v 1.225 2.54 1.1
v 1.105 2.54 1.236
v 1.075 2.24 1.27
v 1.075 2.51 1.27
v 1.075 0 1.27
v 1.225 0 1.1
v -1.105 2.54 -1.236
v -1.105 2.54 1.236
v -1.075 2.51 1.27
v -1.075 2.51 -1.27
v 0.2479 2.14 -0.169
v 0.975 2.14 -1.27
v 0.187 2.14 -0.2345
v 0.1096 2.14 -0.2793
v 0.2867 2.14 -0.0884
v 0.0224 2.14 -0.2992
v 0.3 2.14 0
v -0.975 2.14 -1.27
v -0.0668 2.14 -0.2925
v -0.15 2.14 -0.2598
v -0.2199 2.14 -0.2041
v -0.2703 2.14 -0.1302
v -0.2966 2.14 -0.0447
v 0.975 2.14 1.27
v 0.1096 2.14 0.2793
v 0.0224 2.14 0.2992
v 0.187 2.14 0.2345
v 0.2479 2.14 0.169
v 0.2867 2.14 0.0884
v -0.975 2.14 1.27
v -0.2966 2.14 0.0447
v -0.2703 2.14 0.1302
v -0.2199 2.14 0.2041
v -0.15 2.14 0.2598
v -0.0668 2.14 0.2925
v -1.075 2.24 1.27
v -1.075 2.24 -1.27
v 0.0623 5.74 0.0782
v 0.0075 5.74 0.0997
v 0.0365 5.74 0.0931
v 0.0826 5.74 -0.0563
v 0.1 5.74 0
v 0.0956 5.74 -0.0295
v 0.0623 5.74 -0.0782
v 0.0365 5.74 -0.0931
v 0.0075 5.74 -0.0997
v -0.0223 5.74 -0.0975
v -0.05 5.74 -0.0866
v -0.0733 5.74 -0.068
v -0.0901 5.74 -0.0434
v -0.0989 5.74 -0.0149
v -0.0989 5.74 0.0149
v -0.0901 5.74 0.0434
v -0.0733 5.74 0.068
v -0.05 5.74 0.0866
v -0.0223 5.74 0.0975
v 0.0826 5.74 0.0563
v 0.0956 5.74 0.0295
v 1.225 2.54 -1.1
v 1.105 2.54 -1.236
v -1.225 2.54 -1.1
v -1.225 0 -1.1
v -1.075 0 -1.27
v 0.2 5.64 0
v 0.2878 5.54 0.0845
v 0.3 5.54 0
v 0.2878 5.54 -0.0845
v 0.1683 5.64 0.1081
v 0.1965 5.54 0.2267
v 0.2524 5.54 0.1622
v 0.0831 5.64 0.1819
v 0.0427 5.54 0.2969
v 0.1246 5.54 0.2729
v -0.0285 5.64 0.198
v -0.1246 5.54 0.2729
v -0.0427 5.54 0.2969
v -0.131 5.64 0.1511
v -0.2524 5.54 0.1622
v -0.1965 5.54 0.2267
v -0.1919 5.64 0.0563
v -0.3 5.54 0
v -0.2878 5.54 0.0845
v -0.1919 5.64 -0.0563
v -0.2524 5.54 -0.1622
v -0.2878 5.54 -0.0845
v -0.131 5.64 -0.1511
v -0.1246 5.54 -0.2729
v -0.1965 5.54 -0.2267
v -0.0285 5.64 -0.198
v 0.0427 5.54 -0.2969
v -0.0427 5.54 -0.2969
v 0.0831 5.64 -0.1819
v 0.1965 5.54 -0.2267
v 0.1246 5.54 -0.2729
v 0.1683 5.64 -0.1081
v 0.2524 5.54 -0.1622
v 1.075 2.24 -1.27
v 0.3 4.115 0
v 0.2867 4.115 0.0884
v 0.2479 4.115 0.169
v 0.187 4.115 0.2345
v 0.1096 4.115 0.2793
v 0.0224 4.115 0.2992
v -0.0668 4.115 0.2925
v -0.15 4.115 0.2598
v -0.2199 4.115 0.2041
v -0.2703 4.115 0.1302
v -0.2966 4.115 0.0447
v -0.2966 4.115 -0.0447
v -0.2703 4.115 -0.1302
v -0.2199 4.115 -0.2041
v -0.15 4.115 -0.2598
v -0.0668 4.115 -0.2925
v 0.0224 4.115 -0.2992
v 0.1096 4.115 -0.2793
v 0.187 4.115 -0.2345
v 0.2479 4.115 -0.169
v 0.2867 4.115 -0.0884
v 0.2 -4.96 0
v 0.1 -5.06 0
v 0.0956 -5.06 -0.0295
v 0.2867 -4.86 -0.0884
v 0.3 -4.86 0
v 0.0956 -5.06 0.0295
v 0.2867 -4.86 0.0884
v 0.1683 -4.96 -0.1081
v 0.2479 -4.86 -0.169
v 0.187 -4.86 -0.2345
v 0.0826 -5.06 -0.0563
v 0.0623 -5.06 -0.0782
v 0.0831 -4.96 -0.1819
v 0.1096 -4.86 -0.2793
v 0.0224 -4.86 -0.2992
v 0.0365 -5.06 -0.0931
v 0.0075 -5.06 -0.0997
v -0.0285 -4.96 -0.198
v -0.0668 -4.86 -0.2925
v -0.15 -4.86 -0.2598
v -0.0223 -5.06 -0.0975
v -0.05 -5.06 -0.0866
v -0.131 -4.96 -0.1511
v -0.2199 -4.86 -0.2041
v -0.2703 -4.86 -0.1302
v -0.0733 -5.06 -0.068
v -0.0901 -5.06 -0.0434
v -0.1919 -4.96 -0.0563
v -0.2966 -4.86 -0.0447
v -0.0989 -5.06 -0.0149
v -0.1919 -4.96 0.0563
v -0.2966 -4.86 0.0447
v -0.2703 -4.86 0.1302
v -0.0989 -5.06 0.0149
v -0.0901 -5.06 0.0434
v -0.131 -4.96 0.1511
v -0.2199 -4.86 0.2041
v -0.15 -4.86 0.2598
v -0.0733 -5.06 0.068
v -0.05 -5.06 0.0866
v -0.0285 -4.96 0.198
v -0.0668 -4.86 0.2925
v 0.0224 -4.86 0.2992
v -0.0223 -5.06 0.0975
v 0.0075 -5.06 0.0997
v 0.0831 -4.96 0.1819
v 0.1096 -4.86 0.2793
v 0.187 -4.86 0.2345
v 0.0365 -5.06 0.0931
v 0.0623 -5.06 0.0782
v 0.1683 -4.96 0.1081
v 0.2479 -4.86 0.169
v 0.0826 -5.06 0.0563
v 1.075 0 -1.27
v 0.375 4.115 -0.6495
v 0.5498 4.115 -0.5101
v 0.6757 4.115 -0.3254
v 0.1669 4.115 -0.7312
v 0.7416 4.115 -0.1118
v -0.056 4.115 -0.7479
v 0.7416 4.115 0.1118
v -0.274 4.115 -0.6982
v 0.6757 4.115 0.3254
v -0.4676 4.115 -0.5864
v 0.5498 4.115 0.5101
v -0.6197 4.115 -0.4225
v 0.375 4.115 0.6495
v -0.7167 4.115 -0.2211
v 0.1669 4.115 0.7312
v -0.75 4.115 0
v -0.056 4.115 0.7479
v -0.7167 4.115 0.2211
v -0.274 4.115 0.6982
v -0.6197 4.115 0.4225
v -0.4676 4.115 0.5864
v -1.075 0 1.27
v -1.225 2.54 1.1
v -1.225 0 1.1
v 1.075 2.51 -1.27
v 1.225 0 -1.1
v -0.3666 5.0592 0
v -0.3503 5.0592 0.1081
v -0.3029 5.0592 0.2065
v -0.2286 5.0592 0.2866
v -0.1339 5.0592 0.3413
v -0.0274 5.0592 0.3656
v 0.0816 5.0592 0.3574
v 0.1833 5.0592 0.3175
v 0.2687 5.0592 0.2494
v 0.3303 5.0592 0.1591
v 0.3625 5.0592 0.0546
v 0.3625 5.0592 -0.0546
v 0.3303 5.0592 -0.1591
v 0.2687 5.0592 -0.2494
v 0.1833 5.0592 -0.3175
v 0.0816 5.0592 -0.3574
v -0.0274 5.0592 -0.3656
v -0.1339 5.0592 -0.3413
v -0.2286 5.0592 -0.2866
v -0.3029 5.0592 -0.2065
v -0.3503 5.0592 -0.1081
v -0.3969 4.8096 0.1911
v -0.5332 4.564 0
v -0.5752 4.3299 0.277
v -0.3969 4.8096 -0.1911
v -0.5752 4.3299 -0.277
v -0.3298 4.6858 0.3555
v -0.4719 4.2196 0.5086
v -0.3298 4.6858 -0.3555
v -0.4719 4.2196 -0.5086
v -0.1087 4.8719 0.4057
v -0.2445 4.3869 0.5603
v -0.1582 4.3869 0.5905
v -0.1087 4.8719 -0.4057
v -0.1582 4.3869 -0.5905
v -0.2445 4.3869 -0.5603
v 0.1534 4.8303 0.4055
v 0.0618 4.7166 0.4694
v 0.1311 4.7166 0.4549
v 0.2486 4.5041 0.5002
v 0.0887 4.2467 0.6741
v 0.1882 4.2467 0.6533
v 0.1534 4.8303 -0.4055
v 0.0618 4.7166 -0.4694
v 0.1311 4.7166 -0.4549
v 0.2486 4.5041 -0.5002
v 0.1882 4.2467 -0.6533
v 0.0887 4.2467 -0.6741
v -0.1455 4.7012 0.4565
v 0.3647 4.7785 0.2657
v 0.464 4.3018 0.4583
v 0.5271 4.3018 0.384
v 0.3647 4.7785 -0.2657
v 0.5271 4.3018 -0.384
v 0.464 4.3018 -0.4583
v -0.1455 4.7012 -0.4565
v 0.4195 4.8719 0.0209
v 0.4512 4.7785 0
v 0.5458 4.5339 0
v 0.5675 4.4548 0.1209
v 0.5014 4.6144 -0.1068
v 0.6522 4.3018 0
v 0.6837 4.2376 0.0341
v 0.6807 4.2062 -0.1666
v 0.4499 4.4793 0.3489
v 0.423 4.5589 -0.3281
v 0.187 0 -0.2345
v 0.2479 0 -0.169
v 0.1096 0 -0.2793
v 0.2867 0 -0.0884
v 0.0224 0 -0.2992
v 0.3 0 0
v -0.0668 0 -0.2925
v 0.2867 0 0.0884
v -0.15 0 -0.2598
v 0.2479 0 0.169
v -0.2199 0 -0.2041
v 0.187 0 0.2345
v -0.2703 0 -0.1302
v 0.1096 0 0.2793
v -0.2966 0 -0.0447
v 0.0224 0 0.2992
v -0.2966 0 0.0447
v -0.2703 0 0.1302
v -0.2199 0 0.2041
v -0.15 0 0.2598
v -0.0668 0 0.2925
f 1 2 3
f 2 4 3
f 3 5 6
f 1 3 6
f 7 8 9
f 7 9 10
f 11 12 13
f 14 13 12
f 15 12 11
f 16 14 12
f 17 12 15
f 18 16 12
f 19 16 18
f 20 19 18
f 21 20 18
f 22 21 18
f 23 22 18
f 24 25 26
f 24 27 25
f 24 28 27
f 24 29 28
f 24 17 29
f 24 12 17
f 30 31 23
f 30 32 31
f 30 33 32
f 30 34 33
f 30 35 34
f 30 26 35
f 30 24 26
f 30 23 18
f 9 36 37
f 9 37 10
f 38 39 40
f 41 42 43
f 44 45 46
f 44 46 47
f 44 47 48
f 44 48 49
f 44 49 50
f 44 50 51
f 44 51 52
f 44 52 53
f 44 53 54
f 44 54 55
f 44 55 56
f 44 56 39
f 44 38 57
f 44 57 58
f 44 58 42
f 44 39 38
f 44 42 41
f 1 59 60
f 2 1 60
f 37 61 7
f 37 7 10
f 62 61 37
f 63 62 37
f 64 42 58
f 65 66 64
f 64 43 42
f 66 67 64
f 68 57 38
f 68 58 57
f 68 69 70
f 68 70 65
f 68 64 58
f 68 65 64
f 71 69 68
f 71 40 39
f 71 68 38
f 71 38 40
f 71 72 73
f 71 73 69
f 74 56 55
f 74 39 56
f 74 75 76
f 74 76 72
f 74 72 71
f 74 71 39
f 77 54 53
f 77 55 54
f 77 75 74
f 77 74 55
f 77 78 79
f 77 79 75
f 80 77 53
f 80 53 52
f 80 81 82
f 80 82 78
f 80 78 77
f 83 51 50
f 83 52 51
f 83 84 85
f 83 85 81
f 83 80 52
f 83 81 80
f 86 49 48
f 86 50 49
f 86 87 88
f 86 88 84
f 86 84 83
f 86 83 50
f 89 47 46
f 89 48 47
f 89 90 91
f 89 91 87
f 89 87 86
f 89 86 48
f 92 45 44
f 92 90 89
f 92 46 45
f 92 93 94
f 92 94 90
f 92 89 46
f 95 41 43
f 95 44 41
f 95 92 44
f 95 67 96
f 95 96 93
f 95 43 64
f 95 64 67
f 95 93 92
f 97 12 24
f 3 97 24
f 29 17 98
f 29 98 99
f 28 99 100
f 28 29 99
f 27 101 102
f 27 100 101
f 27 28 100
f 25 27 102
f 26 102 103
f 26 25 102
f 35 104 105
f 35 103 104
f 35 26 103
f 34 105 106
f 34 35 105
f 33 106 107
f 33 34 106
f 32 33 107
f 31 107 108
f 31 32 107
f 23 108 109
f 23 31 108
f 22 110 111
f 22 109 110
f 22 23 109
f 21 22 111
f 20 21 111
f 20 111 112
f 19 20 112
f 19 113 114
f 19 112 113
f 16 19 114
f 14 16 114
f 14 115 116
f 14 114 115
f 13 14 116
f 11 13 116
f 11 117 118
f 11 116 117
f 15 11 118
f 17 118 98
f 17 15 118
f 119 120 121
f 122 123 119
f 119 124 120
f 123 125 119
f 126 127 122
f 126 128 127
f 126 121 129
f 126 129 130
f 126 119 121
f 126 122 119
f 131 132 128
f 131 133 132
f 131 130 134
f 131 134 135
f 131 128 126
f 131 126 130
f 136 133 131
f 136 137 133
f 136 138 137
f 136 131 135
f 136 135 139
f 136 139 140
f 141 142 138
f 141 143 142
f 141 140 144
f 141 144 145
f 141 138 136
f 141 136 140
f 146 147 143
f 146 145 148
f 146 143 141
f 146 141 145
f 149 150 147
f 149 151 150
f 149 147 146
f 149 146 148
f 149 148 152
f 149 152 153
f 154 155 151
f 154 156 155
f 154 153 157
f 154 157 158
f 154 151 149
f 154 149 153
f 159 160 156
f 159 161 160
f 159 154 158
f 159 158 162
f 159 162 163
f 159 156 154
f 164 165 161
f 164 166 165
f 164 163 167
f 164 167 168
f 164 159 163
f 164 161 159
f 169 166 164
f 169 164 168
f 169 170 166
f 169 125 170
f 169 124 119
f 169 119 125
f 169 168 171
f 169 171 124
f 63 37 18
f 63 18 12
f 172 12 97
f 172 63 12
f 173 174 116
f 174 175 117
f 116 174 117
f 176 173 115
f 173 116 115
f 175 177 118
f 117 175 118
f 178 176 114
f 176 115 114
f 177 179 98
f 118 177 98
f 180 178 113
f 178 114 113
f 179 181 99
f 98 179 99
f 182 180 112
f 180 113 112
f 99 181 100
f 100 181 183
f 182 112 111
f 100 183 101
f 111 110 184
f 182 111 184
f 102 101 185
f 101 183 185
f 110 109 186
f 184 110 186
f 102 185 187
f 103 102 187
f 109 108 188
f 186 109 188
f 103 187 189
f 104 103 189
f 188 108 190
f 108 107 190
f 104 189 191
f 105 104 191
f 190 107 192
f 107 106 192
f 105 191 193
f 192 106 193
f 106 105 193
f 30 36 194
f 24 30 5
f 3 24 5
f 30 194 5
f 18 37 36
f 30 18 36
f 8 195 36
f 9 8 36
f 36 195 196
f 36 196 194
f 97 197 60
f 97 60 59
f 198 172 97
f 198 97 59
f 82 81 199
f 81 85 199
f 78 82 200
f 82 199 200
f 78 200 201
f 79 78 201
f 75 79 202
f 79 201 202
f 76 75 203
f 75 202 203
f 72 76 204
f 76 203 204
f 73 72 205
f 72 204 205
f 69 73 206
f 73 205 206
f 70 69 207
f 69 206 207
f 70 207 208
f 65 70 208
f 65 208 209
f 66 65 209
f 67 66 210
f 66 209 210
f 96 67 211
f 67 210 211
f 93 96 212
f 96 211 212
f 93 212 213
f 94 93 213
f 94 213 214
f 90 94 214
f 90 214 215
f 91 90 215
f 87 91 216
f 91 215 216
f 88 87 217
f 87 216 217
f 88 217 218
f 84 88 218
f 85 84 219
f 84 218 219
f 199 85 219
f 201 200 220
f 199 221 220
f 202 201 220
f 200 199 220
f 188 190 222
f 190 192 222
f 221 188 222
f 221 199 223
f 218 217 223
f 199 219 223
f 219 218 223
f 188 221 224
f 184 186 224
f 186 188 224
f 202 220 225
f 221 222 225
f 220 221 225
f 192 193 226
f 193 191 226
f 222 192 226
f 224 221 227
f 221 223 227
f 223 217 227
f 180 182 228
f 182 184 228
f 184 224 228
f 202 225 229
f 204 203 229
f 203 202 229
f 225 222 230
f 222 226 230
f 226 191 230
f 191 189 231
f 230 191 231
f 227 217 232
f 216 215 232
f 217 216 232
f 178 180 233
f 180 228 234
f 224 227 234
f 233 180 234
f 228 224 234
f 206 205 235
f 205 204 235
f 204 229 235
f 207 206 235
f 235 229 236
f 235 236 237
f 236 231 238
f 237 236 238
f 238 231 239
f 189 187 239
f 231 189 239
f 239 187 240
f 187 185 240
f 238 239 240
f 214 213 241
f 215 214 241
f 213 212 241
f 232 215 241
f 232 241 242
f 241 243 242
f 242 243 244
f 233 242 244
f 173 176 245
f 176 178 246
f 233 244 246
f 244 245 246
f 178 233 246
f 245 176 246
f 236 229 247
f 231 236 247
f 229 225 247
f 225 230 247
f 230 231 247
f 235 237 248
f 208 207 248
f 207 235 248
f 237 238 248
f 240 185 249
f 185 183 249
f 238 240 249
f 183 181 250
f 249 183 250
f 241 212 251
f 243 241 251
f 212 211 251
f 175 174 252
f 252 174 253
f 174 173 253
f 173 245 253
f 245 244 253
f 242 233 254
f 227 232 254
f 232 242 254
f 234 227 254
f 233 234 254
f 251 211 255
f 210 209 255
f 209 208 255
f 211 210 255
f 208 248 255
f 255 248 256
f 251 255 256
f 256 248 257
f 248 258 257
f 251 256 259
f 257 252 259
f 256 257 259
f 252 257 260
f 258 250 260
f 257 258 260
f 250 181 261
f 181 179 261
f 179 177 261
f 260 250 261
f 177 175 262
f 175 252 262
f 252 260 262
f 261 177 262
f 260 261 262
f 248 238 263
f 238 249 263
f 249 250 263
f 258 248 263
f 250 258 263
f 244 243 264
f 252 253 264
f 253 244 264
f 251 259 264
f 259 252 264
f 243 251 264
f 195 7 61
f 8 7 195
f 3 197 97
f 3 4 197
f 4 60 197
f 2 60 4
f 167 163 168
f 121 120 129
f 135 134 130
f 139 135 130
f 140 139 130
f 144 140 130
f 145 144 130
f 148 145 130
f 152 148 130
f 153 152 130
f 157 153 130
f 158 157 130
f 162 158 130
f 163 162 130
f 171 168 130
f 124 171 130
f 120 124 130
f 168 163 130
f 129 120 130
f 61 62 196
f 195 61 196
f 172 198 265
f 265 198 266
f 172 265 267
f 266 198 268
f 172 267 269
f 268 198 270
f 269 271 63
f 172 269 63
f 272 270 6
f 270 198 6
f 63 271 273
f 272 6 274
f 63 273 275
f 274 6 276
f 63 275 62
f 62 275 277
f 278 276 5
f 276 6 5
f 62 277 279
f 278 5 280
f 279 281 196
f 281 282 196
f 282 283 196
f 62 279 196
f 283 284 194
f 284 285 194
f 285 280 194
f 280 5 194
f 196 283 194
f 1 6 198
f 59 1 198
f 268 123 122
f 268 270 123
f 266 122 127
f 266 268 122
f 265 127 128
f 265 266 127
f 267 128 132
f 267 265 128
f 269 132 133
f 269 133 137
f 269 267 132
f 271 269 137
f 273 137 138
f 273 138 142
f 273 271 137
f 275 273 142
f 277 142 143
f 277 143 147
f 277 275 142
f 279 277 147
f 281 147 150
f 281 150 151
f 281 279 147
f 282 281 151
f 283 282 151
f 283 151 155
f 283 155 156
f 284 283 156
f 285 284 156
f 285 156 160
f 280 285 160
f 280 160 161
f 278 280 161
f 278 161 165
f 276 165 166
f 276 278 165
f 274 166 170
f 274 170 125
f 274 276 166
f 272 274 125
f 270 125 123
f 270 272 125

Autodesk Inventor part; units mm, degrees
ref_plane "YZ Plane" through (0, 0, 0) normal (1, 0, 0) x (0, 1, 0)
ref_plane "XZ Plane" through (0, 0, 0) normal (0, 1, 0) x (-1, 0, 0)
sketch "Sketch5" plane through (0, 0, 0) normal (0, 1, 0) x (-1, 0, 0)
  line L0 (-1.225, -1.1) -> (1.225, -1.1)
  line L1 (1.225, -1.1) -> (1.225, 1.1)
  line L2 (1.225, 1.1) -> (-1.225, 1.1)
  line L3 (-1.225, 1.1) -> (-1.225, -1.1)
  line L4 (-1.225, -1.1) -> (1.225, 1.1) construction
  line L5 (1.225, -1.1) -> (-1.225, 1.1) construction
  line L6 (1.225, 1.1) -> (1.075, 1.27)
  line L7 (1.075, 1.27) -> (-1.075, 1.27)
  line L8 (-1.075, 1.27) -> (-1.225, 1.1)
  line L9 (0, 1.1) -> (0, -1.1) construction
  line L10 (1.225, 0) -> (-1.225, 0) construction
  line L11 (1.225, -1.1) -> (1.075, -1.27)
  line L12 (1.075, -1.27) -> (-1.075, -1.27)
  line L13 (-1.075, -1.27) -> (-1.225, -1.1)
  point P0 (0, 0)
  dimension "d33" = 2.2
  dimension "d34" = 2.45
  dimension "d36" = 0.15
  dimension "d37" = 2.54
extrude "Extrusion4" add sketch "Sketch5" along normal blind 2.54
sketch "Sketch6" plane through (-1.075, 0, 1.27) normal (0, 0, 1) x (1, 0, 0)
  line L0 (0, 2.54) -> (2.15, 2.54) projected
  line L1 (2.15, 2.14) -> (0, 2.14)
  line L2 (0, 2.14) -> (0, 2.54)
  line L3 (0, 2.54) -> (2.15, 2.54)
  line L4 (2.15, 2.54) -> (2.15, 2.14)
  line L5 (2.15, 2.14) -> (0, 2.54) construction
  line L6 (0, 2.14) -> (2.15, 2.54) construction
  line L7 (1.075, 0) -> (1.075, 2.54) construction
  point P0 (1.075, 2.34)
  dimension "d40" = 2.15
  dimension "d41" = 0.4
extrude "Extrusion5" cut sketch "Sketch6" against normal through all
chamfer "Chamfer3" distance 0.1 angle 45 2 edges at (-1.075, 2.14, 0) (1.075, 2.14, 0)
chamfer "Chamfer4" distance 0.03 angle 45 2 edges at (1.075, 2.54, 0) (-1.075, 2.54, 0)
sketch "Sketch7" plane through (-0.975, 2.14, 1.27) normal (0, 1, 0) x (1, 0, 0)
  circle A0 centre (0.975, 1.27) radius 0.3
  dimension "d50" = 0.6
extrude "Extrusion6" add sketch "Sketch7" along normal blind 3.6 and the other way blind 7.2
chamfer "Chamfer5" distance 0.2 angle 45 2 edges at (-0.3, 5.74, 0) (-0.3, -5.06, 0)
ref_plane "Work Plane1" through (0, 2.14, 0) normal (0, 0, -1) x (0, 1, 0)
sketch "Sketch8" plane through (0, 2.14, 0) normal (0, 0, -1) x (0, 1, 0)
  line L0 (0, -0.3) -> (3.4, -0.3) projected
  line L1 (1.975, -0.75) -> (1.975, 0)
  line L2 (3.4, 0) -> (3.4, -0.3)
  line L3 (0, 0.3) -> (0, -0.3) projected
  line L4 (3.4, -0.3) -> (3.4, 0.3) projected
  line L5 (3.6, 0.1) -> (3.6, -0.1) construction
  line L6 (3.6, 0) -> (0, 0) construction
  line L7 (-9.36, 0) -> (5.76, 0) construction
  line L8 (0.4, -1.225) -> (0.4, -1.105) construction
  line L9 (3.4, -0.3) -> (3.4, 0.3) projected
  line L10 (3.4, 0) -> (1.975, 0)
  line L11 (3.4, -0.3) -> (2.9466, -0.3) construction
  line L12 (2.9466, -0.3) -> (2.3806, -0.5247) construction
  line L13 (2.3806, -0.5247) -> (1.975, -0.75) construction
  spline S0 degree 3 poles (3.4, -0.3) (2.9466, -0.3) (2.3806, -0.5247) (1.975, -0.75) knots 1 1 1 1 2 2 2 2
  point P0 (-2.14, 0)
  point P1 (1.975, -0.3)
  dimension "d59" = 1.575
  dimension "d61" = 0.75
revolve "Revolution1" add sketch "Sketch8" angle 360 about axis through (0, 2.14, 0) along (0, 1, 0) contours L0 S0 L1
properties part number "pins"
